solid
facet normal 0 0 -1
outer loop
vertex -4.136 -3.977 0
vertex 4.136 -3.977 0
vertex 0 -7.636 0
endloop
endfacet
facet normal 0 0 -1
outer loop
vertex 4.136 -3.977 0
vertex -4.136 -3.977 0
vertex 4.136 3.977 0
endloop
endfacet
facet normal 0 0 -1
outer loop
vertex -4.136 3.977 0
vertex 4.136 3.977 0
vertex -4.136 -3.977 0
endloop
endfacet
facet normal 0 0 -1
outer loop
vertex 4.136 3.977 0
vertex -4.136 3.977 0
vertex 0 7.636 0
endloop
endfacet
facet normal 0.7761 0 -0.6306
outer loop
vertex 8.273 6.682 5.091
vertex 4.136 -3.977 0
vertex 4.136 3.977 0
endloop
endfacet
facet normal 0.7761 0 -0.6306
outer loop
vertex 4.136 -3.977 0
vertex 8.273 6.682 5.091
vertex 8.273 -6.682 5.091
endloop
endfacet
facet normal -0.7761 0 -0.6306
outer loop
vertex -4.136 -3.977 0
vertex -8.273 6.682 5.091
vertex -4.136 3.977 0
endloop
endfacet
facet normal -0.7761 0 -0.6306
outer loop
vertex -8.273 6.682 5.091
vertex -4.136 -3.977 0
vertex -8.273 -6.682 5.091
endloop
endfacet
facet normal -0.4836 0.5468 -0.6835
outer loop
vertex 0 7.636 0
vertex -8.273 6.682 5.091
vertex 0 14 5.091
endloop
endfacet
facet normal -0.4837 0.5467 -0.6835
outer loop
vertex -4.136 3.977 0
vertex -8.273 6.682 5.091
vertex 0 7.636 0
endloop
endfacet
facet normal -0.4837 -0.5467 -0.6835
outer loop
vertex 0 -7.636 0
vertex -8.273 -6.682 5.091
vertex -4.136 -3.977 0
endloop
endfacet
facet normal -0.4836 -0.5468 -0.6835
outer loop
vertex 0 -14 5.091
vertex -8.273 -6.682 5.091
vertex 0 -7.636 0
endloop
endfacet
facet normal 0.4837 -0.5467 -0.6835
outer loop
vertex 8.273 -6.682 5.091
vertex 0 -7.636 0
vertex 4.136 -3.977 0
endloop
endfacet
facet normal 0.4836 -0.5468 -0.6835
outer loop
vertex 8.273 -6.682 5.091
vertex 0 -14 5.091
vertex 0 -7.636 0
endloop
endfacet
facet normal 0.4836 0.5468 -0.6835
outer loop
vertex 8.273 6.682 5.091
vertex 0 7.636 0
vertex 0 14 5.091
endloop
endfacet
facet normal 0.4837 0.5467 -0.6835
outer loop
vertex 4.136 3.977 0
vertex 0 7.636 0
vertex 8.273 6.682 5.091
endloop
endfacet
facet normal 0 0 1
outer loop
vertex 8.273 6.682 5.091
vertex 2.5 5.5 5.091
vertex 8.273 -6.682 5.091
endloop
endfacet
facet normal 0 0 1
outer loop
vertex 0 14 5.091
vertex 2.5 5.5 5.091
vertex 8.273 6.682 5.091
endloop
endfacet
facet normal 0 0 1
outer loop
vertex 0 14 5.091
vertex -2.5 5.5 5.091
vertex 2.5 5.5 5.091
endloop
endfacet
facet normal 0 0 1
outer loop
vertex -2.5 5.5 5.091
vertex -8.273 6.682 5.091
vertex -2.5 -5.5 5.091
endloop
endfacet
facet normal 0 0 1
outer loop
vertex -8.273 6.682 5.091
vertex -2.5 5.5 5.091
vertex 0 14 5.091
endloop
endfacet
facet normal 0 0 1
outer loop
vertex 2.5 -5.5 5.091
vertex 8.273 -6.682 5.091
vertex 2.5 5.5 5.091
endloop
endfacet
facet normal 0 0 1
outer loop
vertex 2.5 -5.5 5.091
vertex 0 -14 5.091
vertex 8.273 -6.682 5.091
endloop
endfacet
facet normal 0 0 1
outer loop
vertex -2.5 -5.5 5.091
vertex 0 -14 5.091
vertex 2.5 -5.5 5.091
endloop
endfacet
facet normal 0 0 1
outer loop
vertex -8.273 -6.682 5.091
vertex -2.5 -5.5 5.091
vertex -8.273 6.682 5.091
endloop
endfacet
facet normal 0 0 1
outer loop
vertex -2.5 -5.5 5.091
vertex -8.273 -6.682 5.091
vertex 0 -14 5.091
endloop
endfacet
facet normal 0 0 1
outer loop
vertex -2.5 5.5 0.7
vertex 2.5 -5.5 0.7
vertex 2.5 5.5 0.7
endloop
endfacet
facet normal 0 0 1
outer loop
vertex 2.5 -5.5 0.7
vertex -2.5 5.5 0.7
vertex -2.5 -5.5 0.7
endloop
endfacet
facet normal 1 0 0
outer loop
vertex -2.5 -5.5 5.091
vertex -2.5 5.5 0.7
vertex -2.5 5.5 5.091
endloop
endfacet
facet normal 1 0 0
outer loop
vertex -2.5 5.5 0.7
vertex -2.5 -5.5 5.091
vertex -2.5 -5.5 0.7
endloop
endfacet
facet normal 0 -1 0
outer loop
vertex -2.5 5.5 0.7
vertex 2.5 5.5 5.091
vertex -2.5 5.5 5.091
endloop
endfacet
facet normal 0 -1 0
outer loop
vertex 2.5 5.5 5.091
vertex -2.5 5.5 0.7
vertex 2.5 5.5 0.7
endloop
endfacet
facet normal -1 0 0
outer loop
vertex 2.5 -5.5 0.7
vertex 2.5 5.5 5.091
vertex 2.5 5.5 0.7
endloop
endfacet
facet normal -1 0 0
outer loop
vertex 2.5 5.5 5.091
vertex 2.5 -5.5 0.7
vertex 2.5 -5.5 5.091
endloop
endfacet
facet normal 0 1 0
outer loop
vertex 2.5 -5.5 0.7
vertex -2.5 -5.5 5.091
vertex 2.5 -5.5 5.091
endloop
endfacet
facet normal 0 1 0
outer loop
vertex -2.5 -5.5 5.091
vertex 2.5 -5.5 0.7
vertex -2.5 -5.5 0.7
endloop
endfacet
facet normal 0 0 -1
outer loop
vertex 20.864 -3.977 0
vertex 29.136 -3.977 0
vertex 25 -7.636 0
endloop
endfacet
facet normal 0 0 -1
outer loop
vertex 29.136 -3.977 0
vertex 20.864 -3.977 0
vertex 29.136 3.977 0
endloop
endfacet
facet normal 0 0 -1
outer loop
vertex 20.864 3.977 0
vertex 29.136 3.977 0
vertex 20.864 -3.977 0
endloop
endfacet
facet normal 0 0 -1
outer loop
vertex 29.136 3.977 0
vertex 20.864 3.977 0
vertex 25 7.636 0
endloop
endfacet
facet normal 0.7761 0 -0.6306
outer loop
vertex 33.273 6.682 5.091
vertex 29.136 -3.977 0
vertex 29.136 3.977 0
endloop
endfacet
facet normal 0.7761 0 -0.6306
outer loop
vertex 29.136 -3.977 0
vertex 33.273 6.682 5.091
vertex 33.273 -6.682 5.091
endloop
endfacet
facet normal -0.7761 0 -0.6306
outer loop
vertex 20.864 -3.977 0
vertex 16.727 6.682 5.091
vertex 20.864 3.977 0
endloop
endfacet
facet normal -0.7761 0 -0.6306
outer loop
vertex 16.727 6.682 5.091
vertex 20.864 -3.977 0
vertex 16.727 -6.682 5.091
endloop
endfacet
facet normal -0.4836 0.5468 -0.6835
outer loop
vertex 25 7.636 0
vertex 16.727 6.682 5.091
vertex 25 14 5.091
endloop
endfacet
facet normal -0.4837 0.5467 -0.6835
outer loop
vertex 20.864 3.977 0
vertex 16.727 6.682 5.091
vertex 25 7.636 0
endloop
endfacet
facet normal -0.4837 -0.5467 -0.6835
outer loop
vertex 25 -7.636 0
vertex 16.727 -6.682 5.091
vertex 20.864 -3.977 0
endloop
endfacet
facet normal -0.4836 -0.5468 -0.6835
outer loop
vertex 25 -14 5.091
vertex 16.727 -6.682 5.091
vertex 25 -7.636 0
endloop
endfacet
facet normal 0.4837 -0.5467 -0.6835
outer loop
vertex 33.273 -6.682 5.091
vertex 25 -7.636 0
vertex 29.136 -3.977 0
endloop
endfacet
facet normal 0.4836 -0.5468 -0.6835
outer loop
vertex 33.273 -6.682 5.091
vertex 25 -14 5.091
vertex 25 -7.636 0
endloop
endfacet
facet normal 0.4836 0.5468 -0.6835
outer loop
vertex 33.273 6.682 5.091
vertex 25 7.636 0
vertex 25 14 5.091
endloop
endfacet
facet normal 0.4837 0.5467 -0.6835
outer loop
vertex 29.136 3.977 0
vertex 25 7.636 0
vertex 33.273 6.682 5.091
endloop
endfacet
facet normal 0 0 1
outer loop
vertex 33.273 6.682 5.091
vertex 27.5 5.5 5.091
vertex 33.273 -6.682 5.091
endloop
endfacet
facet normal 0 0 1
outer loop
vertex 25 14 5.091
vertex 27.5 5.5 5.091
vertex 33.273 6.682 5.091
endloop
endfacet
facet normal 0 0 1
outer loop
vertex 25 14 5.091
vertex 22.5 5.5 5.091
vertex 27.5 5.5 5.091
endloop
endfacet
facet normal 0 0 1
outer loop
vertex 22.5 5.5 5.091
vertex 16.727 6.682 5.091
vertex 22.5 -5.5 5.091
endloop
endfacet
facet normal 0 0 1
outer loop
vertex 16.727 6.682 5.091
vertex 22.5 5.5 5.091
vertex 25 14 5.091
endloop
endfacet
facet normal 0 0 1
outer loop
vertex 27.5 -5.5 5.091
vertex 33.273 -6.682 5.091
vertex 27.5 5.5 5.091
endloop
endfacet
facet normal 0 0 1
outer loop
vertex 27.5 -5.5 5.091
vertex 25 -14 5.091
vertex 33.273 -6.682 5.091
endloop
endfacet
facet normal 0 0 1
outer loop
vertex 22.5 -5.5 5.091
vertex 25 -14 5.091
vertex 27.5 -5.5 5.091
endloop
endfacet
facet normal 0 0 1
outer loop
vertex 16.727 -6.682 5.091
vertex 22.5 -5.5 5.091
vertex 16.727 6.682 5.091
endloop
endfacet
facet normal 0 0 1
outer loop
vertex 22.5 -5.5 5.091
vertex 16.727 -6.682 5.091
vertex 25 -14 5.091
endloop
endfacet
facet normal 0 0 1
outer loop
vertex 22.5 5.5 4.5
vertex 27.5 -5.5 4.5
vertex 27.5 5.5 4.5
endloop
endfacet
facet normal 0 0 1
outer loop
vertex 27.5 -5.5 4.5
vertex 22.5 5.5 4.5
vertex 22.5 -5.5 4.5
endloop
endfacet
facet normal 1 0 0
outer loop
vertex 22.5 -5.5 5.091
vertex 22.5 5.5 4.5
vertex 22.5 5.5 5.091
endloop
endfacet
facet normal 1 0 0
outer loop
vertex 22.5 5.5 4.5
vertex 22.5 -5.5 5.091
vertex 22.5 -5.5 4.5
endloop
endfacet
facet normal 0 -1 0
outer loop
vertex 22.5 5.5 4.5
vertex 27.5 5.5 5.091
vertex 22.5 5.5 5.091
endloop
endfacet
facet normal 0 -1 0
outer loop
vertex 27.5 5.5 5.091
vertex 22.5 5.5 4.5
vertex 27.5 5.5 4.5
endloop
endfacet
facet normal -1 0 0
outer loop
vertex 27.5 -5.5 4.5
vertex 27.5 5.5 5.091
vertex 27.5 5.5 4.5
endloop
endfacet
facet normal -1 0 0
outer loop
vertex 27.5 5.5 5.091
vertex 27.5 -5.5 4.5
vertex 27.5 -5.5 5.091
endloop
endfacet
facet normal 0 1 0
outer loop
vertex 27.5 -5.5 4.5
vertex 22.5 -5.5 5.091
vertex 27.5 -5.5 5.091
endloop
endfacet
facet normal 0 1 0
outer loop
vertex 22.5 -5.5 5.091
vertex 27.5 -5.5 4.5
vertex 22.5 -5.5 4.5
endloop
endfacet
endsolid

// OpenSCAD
// rupee_magnet_master.scad
// author: easter_jedi
//TO CUSTOMIZE:
// (1) Change the height to change the size; the rest of the dimensions will adjust based on the height to keep the ratios correct.
// (2) Change the magnet module to fit your magnets.
// (3) Place the magnet cut-out in the rupee frame, about 0.5 mm (or less if your printer can handle it) in from a flat side; thinner means the overall magnet will be stronger.
// *customization points are marked with "NOTE" comments.

echo(version=version());

//NOTE: height defined here
height=35*5/6.25; //height, in mm

//NOTE: magnet shape defined here
module magnet(){
    //10x8x4mm + tolerance
    linear_extrude(height=10) //d=10.4 so h=5.2-0.5 = 4.7
        square([5,11],center=true);
}

h=height; //height, in mm (configurable, and the rest will adjust)
w=26 *h/44; //all the way across
s=21 *h/44; //side height
//front and back:
h2=24 *h/44;
w2=13 *h/44;
s2=12.5 *h/44;
//depth:
d=16*h/44;

module rupee_solid(){
    translate([0,0,d/2])rotate([180,0,0])
    polyhedron(points=[[-w/2,-s/2,0],[0,-h/2,0],[w/2,-s/2,0],
             [w/2,s/2,0],[0,h/2,0],[-w/2,s/2,0],
             [-w2/2,-s2/2,d/2],[0,-h2/2,d/2],[w2/2,-s2/2,d/2],
             [w2/2,s2/2,d/2],[0,h2/2,d/2],[-w2/2,s2/2,d/2],
             [-w2/2,-s2/2,-d/2],[0,-h2/2,-d/2],[w2/2,-s2/2,-d/2],
             [w2/2,s2/2,-d/2],[0,h2/2,-d/2],[-w2/2,s2/2,-d/2],],
           faces=[[6,7,8,9,10,11],//[17,16,15,14,13,12],
             [2,3,9,8],[5,0,6,11],[0,1,7,6],
             [4,5,11,10],[3,4,10,9],[1,2,8,7],
               [5,4,3,2,1,0]
            // [1,2,14,13],[2,3,15,14],[3,4,16,15],
             //[4,5,17,16],[5,0,12,17],[0,1,13,12]
           ]);
}

//print in two halves, magnet hole side up
//NOTE: magnet placement determined here
difference(){
    rupee_solid();
    translate([0,0,0.7]) magnet();
}
translate([25,0,0])
difference(){
    rupee_solid();
    translate([0,0,4.5]) magnet();
}
